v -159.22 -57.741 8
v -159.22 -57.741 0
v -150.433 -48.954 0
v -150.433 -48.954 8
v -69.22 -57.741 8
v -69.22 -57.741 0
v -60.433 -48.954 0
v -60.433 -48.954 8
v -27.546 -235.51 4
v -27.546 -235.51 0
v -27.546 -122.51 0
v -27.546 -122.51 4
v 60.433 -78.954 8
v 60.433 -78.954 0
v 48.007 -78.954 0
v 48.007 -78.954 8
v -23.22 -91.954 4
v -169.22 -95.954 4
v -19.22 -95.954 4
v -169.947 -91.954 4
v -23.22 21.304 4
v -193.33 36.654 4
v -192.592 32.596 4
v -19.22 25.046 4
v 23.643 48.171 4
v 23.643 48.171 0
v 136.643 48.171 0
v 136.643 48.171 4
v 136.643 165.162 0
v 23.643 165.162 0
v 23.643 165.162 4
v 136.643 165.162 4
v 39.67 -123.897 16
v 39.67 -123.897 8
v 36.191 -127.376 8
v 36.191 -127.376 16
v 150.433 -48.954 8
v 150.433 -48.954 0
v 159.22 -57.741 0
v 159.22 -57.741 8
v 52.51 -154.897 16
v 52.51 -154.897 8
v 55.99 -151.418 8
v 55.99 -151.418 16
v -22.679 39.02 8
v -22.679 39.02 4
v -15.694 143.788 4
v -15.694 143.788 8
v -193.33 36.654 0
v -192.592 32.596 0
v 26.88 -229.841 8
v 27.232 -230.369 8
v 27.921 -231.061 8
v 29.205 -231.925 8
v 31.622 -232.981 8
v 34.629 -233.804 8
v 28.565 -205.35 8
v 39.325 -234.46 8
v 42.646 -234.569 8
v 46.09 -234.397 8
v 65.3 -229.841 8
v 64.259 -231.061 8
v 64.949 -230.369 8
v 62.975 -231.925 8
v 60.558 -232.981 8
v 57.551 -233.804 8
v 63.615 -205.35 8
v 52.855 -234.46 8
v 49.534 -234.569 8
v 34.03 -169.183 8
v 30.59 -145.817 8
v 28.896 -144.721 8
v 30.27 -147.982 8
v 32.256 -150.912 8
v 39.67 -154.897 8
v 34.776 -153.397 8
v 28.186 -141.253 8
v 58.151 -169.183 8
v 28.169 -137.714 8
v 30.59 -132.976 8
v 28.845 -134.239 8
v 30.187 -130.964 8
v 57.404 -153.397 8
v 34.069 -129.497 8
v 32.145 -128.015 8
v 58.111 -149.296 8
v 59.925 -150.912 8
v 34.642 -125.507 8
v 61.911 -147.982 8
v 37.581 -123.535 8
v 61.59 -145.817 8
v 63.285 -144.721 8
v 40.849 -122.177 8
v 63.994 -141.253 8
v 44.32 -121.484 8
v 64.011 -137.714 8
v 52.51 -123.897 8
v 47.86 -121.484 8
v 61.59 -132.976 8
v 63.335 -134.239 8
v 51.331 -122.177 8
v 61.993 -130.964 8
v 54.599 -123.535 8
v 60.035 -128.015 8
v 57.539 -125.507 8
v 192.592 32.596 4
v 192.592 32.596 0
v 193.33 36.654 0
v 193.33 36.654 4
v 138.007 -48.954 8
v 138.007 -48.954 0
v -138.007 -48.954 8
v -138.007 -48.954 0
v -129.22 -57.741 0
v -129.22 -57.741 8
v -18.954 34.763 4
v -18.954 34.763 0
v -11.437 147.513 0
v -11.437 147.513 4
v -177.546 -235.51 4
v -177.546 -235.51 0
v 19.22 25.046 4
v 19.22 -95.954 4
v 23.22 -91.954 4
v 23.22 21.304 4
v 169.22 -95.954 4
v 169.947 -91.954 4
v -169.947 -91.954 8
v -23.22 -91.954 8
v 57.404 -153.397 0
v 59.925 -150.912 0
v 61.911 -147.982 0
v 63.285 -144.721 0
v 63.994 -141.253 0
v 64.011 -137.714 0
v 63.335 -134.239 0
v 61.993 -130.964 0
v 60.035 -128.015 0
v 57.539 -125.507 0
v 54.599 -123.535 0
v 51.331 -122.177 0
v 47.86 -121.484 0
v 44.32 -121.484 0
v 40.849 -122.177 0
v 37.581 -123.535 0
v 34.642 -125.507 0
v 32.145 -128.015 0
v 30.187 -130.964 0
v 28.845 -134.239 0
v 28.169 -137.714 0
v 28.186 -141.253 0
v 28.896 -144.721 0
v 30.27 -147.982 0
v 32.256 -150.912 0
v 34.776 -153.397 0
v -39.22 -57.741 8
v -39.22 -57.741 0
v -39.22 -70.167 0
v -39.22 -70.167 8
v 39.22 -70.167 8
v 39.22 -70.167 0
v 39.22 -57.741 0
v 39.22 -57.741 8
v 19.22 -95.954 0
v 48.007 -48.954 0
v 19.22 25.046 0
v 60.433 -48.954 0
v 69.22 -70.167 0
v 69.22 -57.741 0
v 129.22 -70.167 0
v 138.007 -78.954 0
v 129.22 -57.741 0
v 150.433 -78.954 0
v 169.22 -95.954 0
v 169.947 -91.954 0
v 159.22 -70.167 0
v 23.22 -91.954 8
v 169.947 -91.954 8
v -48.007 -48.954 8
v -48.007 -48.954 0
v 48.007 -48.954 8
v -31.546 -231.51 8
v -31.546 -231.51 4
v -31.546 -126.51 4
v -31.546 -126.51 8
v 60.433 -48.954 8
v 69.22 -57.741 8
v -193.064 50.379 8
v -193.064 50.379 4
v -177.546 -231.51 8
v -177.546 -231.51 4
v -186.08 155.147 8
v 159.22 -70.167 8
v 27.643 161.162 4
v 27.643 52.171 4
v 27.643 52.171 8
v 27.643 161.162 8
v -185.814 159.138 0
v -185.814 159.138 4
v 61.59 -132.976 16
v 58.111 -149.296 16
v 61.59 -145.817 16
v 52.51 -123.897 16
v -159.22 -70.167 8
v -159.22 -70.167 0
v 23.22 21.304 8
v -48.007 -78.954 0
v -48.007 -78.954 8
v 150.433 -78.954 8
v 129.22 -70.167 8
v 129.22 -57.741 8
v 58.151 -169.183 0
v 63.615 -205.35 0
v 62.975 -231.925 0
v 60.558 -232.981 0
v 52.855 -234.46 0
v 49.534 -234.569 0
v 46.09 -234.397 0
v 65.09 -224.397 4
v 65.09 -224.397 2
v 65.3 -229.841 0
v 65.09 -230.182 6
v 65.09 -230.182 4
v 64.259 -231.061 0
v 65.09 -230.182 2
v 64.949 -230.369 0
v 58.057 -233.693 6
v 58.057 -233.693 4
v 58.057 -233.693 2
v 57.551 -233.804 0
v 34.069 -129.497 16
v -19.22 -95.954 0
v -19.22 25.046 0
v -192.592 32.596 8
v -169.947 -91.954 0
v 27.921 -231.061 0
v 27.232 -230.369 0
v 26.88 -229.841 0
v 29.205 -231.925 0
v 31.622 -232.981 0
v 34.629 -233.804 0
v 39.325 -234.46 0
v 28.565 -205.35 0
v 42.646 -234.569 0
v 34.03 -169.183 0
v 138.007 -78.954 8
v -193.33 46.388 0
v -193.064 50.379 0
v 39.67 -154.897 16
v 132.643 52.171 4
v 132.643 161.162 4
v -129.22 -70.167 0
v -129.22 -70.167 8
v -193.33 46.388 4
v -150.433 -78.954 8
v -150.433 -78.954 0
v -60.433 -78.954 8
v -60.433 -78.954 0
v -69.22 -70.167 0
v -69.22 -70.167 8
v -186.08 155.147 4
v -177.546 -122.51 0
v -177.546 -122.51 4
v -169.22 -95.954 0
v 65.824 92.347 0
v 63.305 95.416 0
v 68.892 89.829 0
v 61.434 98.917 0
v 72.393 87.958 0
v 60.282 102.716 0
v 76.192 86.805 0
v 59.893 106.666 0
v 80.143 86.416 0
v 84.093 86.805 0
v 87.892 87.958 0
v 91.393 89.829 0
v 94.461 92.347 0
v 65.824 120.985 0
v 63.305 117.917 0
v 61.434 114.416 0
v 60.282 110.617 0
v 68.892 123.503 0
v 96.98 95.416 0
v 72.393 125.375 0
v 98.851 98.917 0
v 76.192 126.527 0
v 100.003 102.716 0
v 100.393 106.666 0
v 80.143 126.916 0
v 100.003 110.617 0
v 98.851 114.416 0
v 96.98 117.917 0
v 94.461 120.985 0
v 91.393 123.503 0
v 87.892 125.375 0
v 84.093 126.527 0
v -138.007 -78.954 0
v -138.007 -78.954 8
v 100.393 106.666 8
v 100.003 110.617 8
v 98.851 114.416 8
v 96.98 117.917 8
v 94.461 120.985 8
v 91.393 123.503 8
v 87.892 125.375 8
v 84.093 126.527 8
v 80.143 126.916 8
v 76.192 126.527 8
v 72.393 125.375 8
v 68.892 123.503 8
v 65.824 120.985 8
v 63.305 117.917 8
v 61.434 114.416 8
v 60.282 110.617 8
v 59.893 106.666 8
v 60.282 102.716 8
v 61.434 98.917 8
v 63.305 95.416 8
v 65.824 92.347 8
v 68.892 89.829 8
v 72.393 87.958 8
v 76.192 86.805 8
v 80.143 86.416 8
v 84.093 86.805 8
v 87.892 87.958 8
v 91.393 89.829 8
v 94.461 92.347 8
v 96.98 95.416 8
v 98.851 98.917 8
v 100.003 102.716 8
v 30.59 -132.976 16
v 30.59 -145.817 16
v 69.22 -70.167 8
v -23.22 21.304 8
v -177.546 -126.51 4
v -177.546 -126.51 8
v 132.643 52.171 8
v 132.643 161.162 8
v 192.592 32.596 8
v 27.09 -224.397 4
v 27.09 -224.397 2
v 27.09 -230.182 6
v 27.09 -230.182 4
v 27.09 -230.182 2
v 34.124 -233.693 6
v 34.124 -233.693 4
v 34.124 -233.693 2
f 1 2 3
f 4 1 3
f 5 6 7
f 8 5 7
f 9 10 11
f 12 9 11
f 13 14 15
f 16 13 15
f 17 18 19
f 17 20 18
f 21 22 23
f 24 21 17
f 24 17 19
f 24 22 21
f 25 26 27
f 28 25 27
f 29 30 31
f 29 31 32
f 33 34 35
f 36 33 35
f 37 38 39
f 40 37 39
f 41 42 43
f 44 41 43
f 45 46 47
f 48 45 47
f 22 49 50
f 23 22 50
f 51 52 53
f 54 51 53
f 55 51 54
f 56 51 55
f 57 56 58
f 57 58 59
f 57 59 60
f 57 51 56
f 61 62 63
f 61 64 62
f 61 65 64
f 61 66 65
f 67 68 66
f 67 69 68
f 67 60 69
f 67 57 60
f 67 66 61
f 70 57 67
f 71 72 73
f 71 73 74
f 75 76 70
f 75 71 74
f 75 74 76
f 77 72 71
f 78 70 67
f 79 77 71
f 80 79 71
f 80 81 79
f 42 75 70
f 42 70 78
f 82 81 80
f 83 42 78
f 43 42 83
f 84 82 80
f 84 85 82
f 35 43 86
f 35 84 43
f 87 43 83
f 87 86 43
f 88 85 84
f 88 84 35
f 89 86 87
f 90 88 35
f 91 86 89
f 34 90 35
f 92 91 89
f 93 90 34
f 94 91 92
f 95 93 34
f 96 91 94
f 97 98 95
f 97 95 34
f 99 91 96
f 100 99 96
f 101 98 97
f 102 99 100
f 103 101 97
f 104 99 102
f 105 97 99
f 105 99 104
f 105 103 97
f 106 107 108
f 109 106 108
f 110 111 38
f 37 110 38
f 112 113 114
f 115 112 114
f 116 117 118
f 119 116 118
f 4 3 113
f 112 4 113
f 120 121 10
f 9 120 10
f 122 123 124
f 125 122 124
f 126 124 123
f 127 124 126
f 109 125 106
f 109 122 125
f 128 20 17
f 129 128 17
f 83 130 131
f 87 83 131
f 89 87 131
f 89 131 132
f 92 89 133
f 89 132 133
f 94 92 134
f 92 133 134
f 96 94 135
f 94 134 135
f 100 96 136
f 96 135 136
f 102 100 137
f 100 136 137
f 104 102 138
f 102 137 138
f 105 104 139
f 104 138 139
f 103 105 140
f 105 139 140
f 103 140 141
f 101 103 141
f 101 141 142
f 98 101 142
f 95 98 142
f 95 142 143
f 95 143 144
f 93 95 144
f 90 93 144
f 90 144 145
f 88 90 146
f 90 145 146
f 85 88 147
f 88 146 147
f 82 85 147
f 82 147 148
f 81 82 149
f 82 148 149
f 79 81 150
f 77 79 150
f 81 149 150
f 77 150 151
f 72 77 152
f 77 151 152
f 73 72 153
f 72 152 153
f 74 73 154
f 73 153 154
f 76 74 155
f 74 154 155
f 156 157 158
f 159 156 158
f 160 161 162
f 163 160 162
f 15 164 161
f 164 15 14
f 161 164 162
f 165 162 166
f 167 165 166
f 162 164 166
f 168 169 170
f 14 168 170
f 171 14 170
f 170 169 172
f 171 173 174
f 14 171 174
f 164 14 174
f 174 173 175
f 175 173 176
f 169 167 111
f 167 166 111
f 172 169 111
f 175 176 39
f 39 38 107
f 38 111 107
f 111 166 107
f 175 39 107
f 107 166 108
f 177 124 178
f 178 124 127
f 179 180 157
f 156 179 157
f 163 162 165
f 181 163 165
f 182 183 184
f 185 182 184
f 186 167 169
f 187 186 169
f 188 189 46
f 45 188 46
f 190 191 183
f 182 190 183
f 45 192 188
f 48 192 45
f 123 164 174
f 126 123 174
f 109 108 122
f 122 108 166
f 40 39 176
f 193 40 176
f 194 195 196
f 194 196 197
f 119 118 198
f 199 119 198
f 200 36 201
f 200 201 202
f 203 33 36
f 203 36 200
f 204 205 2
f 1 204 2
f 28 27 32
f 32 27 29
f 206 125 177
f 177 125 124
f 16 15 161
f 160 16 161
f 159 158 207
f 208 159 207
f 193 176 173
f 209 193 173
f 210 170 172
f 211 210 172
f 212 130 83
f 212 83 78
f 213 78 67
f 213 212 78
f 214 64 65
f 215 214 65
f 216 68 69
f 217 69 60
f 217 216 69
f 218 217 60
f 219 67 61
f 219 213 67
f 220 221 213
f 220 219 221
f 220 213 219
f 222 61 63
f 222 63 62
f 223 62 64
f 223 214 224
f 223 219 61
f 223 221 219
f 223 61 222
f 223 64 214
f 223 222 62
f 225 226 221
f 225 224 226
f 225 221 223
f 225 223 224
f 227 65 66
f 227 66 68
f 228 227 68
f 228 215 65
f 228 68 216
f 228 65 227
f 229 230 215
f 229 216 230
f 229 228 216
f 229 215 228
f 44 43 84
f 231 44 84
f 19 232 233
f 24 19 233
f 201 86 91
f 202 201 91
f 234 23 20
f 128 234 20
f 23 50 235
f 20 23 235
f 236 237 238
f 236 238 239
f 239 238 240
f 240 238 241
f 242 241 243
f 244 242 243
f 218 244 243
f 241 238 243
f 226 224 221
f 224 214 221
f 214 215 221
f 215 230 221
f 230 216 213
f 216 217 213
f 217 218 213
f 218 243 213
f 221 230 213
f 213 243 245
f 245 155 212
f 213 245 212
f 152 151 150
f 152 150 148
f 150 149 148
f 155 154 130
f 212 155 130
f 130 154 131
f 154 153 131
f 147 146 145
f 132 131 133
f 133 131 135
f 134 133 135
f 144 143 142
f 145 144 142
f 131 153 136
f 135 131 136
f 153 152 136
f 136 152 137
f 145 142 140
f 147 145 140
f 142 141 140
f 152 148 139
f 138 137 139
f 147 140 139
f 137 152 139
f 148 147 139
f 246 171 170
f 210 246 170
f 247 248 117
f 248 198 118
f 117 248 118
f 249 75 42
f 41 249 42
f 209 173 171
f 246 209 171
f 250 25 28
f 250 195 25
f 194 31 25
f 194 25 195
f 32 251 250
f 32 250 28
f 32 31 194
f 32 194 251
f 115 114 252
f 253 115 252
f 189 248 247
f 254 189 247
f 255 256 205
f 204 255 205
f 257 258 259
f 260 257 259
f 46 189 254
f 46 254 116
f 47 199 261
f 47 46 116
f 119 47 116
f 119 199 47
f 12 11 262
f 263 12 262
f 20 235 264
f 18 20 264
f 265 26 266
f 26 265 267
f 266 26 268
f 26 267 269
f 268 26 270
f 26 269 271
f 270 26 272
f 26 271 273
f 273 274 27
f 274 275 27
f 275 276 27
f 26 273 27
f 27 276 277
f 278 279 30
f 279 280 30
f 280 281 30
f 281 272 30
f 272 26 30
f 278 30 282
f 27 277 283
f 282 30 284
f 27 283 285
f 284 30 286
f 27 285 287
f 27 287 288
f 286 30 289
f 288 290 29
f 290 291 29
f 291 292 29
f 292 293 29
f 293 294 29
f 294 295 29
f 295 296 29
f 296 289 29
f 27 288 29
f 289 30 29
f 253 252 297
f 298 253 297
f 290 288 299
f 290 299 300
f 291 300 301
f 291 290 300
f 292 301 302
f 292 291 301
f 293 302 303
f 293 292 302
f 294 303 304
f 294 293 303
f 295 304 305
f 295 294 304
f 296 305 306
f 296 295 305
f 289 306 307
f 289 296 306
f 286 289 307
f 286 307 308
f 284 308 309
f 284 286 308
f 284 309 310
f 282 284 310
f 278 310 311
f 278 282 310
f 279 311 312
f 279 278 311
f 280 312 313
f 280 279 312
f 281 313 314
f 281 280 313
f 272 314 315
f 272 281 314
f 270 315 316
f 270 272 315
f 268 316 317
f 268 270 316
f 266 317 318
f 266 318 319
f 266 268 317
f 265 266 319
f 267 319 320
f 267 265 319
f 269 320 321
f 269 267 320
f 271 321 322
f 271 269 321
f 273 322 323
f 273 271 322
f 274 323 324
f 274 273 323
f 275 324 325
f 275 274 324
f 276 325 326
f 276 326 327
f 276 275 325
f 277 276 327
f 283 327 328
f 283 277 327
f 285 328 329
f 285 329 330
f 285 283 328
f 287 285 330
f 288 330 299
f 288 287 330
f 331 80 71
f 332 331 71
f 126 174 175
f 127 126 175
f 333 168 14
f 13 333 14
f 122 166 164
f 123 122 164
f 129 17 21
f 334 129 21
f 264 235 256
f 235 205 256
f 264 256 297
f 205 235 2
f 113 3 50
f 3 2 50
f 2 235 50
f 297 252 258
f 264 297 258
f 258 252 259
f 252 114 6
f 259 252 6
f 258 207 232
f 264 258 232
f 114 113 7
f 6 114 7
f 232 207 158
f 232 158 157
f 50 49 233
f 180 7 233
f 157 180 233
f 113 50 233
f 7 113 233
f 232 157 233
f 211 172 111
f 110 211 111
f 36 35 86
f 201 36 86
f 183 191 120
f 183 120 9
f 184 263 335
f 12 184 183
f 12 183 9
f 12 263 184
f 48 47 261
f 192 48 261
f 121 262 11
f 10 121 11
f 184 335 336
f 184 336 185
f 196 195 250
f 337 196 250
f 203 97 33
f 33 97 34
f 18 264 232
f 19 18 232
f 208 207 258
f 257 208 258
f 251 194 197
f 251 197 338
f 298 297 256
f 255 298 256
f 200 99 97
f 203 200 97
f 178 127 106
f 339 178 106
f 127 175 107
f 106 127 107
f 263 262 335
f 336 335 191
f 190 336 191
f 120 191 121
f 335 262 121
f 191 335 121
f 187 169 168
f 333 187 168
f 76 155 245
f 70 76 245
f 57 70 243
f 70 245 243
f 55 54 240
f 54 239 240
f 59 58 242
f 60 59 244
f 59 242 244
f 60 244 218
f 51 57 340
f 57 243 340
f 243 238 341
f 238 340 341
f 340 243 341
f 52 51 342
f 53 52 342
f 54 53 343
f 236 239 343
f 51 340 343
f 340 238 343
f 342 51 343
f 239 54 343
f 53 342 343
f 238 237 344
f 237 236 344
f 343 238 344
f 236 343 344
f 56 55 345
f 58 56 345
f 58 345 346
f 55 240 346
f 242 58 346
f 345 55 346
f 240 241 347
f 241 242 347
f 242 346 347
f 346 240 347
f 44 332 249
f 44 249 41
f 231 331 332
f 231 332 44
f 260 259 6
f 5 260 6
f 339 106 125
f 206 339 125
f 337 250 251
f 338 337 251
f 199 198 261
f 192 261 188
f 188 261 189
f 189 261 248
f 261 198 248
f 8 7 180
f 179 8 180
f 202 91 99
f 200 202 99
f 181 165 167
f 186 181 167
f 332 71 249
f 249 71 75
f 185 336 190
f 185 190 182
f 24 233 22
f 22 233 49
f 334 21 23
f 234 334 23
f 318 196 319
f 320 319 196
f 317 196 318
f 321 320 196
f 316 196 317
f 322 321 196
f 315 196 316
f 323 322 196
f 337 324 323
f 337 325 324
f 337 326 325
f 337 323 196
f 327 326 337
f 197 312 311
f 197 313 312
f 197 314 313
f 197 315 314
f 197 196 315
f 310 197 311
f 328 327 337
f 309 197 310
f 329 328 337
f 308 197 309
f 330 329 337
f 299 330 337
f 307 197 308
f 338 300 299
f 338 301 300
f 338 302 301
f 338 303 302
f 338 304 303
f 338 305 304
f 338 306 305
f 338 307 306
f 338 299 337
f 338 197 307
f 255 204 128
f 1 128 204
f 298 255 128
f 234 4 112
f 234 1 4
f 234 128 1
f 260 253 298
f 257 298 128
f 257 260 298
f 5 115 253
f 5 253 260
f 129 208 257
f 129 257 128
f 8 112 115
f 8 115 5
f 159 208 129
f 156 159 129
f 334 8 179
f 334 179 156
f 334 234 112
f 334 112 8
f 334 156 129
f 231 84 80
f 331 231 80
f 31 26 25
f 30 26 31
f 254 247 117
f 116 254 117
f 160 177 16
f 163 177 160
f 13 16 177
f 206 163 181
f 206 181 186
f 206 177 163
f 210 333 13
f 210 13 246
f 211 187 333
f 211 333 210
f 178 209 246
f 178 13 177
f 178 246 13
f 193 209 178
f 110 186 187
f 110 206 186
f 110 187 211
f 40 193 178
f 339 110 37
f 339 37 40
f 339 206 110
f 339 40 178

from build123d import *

# Parameters (mm, degrees)
F6_DEPTH  = 8
F7_DEPTH  = 4
F8_DEPTH  = 8
F9_DEPTH  = 4
F10_DEPTH = 8
F11_DEPTH = 4
F2_W      = 146
F2_H      = 105
F12_DEPTH = 8
F13_DEPTH = 4
F4_W      = 105
F4_H      = 108.9911209658
F4_R      = 20.25
F14_DEPTH = 8
F4_W_2    = 113
F4_H_2    = 116.9911209658
F15_DEPTH = 4
F16_DEPTH = 16
F17_DEPTH = 8


with BuildPart() as f6:
    # F1 (on Top) → F6 (new body)
    with BuildSketch(Plane.XY):
        Polygon((-192.5924490942, 32.5955437856), (-169.9471228707, -91.9537504436), (-23.2198501434, -91.9537504436), (-23.2198501434, 21.3040371889), align=None)
        Polygon((-138.0066467078, -48.9537504436), (-129.2198501434, -57.740547008), (-129.2198501434, -70.1669538792), (-138.0066467078, -78.9537504436), (-150.433053579, -78.9537504436), (-159.2198501434, -70.1669538792), (-159.2198501434, -57.740547008), (-150.433053579, -48.9537504436), align=None, mode=Mode.SUBTRACT)
        Polygon((-48.0066467078, -78.9537504436), (-60.433053579, -78.9537504436), (-69.2198501434, -70.1669538792), (-69.2198501434, -57.740547008), (-60.433053579, -48.9537504436), (-48.0066467078, -48.9537504436), (-39.2198501434, -57.740547008), (-39.2198501434, -70.1669538792), align=None, mode=Mode.SUBTRACT)
    extrude(amount=F6_DEPTH)

    # F1 (on Top) → F7 (join)
    with BuildSketch(Plane.XY):
        Polygon((-169.2198501434, -95.9537504436), (-19.2198501434, -95.9537504436), (-19.2198501434, 25.0462495564), (-193.3302795913, 36.6536115196), (-192.5924490942, 32.5955437856), (-23.2198501434, 21.3040371889), (-23.2198501434, -91.9537504436), (-169.9471228707, -91.9537504436), align=None)
    extrude(amount=F7_DEPTH)


with BuildPart() as f8:
    # F1 (on Top) → F8 (new body)
    with BuildSketch(Plane.XY):
        Polygon((23.2198501434, 21.3040371889), (23.2198501434, -91.9537504436), (169.9471228707, -91.9537504436), (192.5924490942, 32.5955437856), align=None)
        Polygon((48.0066467078, -48.9537504436), (60.433053579, -48.9537504436), (69.2198501434, -57.740547008), (69.2198501434, -70.1669538792), (60.433053579, -78.9537504436), (48.0066467078, -78.9537504436), (39.2198501434, -70.1669538792), (39.2198501434, -57.740547008), align=None, mode=Mode.SUBTRACT)
        Polygon((138.0066467078, -48.9537504436), (150.433053579, -48.9537504436), (159.2198501434, -57.740547008), (159.2198501434, -70.1669538792), (150.433053579, -78.9537504436), (138.0066467078, -78.9537504436), (129.2198501434, -70.1669538792), (129.2198501434, -57.740547008), align=None, mode=Mode.SUBTRACT)
    extrude(amount=F8_DEPTH)

    # F1 (on Top) → F9 (join)
    with BuildSketch(Plane.XY):
        Polygon((169.9471228707, -91.9537504436), (23.2198501434, -91.9537504436), (23.2198501434, 21.3040371889), (192.5924490942, 32.5955437856), (193.3302795913, 36.6536115196), (19.2198501434, 25.0462495564), (19.2198501434, -95.9537504436), (169.2198501434, -95.9537504436), align=None)
    extrude(amount=F9_DEPTH)


with BuildPart() as f10:
    # F3 (on Top) → F10 (new body)
    with BuildSketch(Plane.XY):
        Polygon((-186.0797074442, 155.1467761713), (-193.0642035492, 50.3793345964), (-22.6788386906, 39.0203102725), (-15.6943425856, 143.7877518474), align=None)
    extrude(amount=F10_DEPTH)

    # F3 (on Top) → F11 (join)
    with BuildSketch(Plane.XY):
        Polygon((-193.0642035492, 50.3793345964), (-193.3302795913, 46.388193965), (-18.9537741013, 34.763093599), (-11.4371259121, 147.5128164368), (-185.8136314021, 159.1379168028), (-186.0797074442, 155.1467761713), (-15.6943425856, 143.7877518474), (-22.6788386906, 39.0203102725), align=None)
    extrude(amount=F11_DEPTH)


with BuildPart() as f12:
    # F2 (on Top) → F12 (new body)
    with BuildSketch(Plane.XY):
        with Locations((-104.5462678192, -179.0099069476)):
            Rectangle(F2_W, F2_H)
    extrude(amount=F12_DEPTH)

    # F2 (on Top) → F13 (join)
    with BuildSketch(Plane.XY):
        Polygon((-27.5462678192, -122.5099069476), (-177.5462678192, -122.5099069476), (-177.5462678192, -126.5099069476), (-31.5462678192, -126.5099069476), (-31.5462678192, -231.5099069476), (-177.5462678192, -231.5099069476), (-177.5462678192, -235.5099069476), (-27.5462678192, -235.5099069476), align=None)
    extrude(amount=F13_DEPTH)


with BuildPart() as f14:
    # F4 (on Top) → F14 (new body)
    with BuildSketch(Plane.XY):
        with Locations((80.142575264, 106.6662354313)):
            Rectangle(F4_W, F4_H)
        with Locations((80.142575264, 106.6662354313)):
            Circle(F4_R, mode=Mode.SUBTRACT)
    extrude(amount=F14_DEPTH)

    # F4 (on Top) → F15 (join)
    with BuildSketch(Plane.XY):
        with Locations((80.142575264, 106.6662354313)):
            Rectangle(F4_W_2, F4_H_2)
        with Locations((80.142575264, 106.6662354313)):
            Rectangle(F4_W, F4_H, mode=Mode.SUBTRACT)
    extrude(amount=F15_DEPTH)


with BuildPart() as f16:
    # F5 (on Top) → F16 (new body)
    with BuildSketch(Plane.XY):
        Polygon((55.9896586491, -151.4175269914), (34.0693484323, -129.4972167746), (30.5901637125, -132.9764014945), (30.5901637125, -145.817021928), (39.6698534957, -154.8967117112), (52.5104739292, -154.8967117112), align=None)
    extrude(amount=F16_DEPTH)



with BuildPart() as f16b:
    # F5 (on Top) → F16, piece 2 (new body)
    with BuildSketch(Plane.XY):
        Polygon((61.5901637125, -132.9764014945), (52.5104739292, -123.8967117112), (39.6698534957, -123.8967117112), (36.1906687759, -127.3758964311), (58.1109789926, -149.2962066479), (61.5901637125, -145.817021928), align=None)
    extrude(amount=F16_DEPTH)


with BuildPart() as f16_1:
    add(f16.part)

    add(f16b.part)  # F17 merges F16b
    # F5 (on Top) → F17 (join)
    with BuildSketch(Plane.XY):
        with BuildLine():
            ThreePointArc((57.4038722114, -153.3967117112), (46.0901637125, -157.3967117112), (34.7764552135, -153.3967117112))
            add(Edge.make_bspline(
                [(34.7764552135, -153.3967117112), (35.7299080503, -167.101117647), (26.9858458268, -204.8912572591), (27.9928429906, -223.3672958501), (24.6374547092, -231.9853224777), (37.4461217021, -235.2007776701), (46.0901637125, -234.3967117112)],
                knots=[0, 0, 0, 0, 0.3936758869, 0.6297535731, 0.7603885514, 1, 1, 1, 1], degree=3))
            add(Edge.make_bspline(
                [(57.4038722114, -153.3967117112), (56.4504193746, -167.101117647), (65.1944815981, -204.8912572591), (64.1874844343, -223.3672958501), (67.5428727157, -231.9853224777), (54.7342057228, -235.2007776701), (46.0901637125, -234.3967117112)],
                knots=[0, 0, 0, 0, 0.3936758869, 0.6297535731, 0.7603885514, 1, 1, 1, 1], degree=3))
        make_face()
        with BuildLine():
            ThreePointArc((57.4038722114, -153.3967117112), (62.3328043996, -147.1540710241), (64.0901637125, -139.3967117112))
            ThreePointArc((64.0901637125, -139.3967117112), (38.3328043996, -123.1540710241), (34.7764552135, -153.3967117112))
            ThreePointArc((34.7764552135, -153.3967117112), (46.0901637125, -157.3967117112), (57.4038722114, -153.3967117112))
        make_face()
        Polygon((39.6698534957, -123.8967117112), (52.5104739292, -123.8967117112), (61.5901637125, -132.9764014945), (61.5901637125, -145.817021928), (58.1109789926, -149.2962066479), (55.9896586491, -151.4175269914), (52.5104739292, -154.8967117112), (39.6698534957, -154.8967117112), (30.5901637125, -145.817021928), (30.5901637125, -132.9764014945), (34.0693484323, -129.4972167746), (36.1906687759, -127.3758964311), align=None, mode=Mode.SUBTRACT)
        Polygon((58.1109789926, -149.2962066479), (36.1906687759, -127.3758964311), (34.0693484323, -129.4972167746), (55.9896586491, -151.4175269914), align=None)
    extrude(amount=F17_DEPTH)


solid = Compound([f6.part, f8.part, f10.part, f12.part, f14.part, f16_1.part])
